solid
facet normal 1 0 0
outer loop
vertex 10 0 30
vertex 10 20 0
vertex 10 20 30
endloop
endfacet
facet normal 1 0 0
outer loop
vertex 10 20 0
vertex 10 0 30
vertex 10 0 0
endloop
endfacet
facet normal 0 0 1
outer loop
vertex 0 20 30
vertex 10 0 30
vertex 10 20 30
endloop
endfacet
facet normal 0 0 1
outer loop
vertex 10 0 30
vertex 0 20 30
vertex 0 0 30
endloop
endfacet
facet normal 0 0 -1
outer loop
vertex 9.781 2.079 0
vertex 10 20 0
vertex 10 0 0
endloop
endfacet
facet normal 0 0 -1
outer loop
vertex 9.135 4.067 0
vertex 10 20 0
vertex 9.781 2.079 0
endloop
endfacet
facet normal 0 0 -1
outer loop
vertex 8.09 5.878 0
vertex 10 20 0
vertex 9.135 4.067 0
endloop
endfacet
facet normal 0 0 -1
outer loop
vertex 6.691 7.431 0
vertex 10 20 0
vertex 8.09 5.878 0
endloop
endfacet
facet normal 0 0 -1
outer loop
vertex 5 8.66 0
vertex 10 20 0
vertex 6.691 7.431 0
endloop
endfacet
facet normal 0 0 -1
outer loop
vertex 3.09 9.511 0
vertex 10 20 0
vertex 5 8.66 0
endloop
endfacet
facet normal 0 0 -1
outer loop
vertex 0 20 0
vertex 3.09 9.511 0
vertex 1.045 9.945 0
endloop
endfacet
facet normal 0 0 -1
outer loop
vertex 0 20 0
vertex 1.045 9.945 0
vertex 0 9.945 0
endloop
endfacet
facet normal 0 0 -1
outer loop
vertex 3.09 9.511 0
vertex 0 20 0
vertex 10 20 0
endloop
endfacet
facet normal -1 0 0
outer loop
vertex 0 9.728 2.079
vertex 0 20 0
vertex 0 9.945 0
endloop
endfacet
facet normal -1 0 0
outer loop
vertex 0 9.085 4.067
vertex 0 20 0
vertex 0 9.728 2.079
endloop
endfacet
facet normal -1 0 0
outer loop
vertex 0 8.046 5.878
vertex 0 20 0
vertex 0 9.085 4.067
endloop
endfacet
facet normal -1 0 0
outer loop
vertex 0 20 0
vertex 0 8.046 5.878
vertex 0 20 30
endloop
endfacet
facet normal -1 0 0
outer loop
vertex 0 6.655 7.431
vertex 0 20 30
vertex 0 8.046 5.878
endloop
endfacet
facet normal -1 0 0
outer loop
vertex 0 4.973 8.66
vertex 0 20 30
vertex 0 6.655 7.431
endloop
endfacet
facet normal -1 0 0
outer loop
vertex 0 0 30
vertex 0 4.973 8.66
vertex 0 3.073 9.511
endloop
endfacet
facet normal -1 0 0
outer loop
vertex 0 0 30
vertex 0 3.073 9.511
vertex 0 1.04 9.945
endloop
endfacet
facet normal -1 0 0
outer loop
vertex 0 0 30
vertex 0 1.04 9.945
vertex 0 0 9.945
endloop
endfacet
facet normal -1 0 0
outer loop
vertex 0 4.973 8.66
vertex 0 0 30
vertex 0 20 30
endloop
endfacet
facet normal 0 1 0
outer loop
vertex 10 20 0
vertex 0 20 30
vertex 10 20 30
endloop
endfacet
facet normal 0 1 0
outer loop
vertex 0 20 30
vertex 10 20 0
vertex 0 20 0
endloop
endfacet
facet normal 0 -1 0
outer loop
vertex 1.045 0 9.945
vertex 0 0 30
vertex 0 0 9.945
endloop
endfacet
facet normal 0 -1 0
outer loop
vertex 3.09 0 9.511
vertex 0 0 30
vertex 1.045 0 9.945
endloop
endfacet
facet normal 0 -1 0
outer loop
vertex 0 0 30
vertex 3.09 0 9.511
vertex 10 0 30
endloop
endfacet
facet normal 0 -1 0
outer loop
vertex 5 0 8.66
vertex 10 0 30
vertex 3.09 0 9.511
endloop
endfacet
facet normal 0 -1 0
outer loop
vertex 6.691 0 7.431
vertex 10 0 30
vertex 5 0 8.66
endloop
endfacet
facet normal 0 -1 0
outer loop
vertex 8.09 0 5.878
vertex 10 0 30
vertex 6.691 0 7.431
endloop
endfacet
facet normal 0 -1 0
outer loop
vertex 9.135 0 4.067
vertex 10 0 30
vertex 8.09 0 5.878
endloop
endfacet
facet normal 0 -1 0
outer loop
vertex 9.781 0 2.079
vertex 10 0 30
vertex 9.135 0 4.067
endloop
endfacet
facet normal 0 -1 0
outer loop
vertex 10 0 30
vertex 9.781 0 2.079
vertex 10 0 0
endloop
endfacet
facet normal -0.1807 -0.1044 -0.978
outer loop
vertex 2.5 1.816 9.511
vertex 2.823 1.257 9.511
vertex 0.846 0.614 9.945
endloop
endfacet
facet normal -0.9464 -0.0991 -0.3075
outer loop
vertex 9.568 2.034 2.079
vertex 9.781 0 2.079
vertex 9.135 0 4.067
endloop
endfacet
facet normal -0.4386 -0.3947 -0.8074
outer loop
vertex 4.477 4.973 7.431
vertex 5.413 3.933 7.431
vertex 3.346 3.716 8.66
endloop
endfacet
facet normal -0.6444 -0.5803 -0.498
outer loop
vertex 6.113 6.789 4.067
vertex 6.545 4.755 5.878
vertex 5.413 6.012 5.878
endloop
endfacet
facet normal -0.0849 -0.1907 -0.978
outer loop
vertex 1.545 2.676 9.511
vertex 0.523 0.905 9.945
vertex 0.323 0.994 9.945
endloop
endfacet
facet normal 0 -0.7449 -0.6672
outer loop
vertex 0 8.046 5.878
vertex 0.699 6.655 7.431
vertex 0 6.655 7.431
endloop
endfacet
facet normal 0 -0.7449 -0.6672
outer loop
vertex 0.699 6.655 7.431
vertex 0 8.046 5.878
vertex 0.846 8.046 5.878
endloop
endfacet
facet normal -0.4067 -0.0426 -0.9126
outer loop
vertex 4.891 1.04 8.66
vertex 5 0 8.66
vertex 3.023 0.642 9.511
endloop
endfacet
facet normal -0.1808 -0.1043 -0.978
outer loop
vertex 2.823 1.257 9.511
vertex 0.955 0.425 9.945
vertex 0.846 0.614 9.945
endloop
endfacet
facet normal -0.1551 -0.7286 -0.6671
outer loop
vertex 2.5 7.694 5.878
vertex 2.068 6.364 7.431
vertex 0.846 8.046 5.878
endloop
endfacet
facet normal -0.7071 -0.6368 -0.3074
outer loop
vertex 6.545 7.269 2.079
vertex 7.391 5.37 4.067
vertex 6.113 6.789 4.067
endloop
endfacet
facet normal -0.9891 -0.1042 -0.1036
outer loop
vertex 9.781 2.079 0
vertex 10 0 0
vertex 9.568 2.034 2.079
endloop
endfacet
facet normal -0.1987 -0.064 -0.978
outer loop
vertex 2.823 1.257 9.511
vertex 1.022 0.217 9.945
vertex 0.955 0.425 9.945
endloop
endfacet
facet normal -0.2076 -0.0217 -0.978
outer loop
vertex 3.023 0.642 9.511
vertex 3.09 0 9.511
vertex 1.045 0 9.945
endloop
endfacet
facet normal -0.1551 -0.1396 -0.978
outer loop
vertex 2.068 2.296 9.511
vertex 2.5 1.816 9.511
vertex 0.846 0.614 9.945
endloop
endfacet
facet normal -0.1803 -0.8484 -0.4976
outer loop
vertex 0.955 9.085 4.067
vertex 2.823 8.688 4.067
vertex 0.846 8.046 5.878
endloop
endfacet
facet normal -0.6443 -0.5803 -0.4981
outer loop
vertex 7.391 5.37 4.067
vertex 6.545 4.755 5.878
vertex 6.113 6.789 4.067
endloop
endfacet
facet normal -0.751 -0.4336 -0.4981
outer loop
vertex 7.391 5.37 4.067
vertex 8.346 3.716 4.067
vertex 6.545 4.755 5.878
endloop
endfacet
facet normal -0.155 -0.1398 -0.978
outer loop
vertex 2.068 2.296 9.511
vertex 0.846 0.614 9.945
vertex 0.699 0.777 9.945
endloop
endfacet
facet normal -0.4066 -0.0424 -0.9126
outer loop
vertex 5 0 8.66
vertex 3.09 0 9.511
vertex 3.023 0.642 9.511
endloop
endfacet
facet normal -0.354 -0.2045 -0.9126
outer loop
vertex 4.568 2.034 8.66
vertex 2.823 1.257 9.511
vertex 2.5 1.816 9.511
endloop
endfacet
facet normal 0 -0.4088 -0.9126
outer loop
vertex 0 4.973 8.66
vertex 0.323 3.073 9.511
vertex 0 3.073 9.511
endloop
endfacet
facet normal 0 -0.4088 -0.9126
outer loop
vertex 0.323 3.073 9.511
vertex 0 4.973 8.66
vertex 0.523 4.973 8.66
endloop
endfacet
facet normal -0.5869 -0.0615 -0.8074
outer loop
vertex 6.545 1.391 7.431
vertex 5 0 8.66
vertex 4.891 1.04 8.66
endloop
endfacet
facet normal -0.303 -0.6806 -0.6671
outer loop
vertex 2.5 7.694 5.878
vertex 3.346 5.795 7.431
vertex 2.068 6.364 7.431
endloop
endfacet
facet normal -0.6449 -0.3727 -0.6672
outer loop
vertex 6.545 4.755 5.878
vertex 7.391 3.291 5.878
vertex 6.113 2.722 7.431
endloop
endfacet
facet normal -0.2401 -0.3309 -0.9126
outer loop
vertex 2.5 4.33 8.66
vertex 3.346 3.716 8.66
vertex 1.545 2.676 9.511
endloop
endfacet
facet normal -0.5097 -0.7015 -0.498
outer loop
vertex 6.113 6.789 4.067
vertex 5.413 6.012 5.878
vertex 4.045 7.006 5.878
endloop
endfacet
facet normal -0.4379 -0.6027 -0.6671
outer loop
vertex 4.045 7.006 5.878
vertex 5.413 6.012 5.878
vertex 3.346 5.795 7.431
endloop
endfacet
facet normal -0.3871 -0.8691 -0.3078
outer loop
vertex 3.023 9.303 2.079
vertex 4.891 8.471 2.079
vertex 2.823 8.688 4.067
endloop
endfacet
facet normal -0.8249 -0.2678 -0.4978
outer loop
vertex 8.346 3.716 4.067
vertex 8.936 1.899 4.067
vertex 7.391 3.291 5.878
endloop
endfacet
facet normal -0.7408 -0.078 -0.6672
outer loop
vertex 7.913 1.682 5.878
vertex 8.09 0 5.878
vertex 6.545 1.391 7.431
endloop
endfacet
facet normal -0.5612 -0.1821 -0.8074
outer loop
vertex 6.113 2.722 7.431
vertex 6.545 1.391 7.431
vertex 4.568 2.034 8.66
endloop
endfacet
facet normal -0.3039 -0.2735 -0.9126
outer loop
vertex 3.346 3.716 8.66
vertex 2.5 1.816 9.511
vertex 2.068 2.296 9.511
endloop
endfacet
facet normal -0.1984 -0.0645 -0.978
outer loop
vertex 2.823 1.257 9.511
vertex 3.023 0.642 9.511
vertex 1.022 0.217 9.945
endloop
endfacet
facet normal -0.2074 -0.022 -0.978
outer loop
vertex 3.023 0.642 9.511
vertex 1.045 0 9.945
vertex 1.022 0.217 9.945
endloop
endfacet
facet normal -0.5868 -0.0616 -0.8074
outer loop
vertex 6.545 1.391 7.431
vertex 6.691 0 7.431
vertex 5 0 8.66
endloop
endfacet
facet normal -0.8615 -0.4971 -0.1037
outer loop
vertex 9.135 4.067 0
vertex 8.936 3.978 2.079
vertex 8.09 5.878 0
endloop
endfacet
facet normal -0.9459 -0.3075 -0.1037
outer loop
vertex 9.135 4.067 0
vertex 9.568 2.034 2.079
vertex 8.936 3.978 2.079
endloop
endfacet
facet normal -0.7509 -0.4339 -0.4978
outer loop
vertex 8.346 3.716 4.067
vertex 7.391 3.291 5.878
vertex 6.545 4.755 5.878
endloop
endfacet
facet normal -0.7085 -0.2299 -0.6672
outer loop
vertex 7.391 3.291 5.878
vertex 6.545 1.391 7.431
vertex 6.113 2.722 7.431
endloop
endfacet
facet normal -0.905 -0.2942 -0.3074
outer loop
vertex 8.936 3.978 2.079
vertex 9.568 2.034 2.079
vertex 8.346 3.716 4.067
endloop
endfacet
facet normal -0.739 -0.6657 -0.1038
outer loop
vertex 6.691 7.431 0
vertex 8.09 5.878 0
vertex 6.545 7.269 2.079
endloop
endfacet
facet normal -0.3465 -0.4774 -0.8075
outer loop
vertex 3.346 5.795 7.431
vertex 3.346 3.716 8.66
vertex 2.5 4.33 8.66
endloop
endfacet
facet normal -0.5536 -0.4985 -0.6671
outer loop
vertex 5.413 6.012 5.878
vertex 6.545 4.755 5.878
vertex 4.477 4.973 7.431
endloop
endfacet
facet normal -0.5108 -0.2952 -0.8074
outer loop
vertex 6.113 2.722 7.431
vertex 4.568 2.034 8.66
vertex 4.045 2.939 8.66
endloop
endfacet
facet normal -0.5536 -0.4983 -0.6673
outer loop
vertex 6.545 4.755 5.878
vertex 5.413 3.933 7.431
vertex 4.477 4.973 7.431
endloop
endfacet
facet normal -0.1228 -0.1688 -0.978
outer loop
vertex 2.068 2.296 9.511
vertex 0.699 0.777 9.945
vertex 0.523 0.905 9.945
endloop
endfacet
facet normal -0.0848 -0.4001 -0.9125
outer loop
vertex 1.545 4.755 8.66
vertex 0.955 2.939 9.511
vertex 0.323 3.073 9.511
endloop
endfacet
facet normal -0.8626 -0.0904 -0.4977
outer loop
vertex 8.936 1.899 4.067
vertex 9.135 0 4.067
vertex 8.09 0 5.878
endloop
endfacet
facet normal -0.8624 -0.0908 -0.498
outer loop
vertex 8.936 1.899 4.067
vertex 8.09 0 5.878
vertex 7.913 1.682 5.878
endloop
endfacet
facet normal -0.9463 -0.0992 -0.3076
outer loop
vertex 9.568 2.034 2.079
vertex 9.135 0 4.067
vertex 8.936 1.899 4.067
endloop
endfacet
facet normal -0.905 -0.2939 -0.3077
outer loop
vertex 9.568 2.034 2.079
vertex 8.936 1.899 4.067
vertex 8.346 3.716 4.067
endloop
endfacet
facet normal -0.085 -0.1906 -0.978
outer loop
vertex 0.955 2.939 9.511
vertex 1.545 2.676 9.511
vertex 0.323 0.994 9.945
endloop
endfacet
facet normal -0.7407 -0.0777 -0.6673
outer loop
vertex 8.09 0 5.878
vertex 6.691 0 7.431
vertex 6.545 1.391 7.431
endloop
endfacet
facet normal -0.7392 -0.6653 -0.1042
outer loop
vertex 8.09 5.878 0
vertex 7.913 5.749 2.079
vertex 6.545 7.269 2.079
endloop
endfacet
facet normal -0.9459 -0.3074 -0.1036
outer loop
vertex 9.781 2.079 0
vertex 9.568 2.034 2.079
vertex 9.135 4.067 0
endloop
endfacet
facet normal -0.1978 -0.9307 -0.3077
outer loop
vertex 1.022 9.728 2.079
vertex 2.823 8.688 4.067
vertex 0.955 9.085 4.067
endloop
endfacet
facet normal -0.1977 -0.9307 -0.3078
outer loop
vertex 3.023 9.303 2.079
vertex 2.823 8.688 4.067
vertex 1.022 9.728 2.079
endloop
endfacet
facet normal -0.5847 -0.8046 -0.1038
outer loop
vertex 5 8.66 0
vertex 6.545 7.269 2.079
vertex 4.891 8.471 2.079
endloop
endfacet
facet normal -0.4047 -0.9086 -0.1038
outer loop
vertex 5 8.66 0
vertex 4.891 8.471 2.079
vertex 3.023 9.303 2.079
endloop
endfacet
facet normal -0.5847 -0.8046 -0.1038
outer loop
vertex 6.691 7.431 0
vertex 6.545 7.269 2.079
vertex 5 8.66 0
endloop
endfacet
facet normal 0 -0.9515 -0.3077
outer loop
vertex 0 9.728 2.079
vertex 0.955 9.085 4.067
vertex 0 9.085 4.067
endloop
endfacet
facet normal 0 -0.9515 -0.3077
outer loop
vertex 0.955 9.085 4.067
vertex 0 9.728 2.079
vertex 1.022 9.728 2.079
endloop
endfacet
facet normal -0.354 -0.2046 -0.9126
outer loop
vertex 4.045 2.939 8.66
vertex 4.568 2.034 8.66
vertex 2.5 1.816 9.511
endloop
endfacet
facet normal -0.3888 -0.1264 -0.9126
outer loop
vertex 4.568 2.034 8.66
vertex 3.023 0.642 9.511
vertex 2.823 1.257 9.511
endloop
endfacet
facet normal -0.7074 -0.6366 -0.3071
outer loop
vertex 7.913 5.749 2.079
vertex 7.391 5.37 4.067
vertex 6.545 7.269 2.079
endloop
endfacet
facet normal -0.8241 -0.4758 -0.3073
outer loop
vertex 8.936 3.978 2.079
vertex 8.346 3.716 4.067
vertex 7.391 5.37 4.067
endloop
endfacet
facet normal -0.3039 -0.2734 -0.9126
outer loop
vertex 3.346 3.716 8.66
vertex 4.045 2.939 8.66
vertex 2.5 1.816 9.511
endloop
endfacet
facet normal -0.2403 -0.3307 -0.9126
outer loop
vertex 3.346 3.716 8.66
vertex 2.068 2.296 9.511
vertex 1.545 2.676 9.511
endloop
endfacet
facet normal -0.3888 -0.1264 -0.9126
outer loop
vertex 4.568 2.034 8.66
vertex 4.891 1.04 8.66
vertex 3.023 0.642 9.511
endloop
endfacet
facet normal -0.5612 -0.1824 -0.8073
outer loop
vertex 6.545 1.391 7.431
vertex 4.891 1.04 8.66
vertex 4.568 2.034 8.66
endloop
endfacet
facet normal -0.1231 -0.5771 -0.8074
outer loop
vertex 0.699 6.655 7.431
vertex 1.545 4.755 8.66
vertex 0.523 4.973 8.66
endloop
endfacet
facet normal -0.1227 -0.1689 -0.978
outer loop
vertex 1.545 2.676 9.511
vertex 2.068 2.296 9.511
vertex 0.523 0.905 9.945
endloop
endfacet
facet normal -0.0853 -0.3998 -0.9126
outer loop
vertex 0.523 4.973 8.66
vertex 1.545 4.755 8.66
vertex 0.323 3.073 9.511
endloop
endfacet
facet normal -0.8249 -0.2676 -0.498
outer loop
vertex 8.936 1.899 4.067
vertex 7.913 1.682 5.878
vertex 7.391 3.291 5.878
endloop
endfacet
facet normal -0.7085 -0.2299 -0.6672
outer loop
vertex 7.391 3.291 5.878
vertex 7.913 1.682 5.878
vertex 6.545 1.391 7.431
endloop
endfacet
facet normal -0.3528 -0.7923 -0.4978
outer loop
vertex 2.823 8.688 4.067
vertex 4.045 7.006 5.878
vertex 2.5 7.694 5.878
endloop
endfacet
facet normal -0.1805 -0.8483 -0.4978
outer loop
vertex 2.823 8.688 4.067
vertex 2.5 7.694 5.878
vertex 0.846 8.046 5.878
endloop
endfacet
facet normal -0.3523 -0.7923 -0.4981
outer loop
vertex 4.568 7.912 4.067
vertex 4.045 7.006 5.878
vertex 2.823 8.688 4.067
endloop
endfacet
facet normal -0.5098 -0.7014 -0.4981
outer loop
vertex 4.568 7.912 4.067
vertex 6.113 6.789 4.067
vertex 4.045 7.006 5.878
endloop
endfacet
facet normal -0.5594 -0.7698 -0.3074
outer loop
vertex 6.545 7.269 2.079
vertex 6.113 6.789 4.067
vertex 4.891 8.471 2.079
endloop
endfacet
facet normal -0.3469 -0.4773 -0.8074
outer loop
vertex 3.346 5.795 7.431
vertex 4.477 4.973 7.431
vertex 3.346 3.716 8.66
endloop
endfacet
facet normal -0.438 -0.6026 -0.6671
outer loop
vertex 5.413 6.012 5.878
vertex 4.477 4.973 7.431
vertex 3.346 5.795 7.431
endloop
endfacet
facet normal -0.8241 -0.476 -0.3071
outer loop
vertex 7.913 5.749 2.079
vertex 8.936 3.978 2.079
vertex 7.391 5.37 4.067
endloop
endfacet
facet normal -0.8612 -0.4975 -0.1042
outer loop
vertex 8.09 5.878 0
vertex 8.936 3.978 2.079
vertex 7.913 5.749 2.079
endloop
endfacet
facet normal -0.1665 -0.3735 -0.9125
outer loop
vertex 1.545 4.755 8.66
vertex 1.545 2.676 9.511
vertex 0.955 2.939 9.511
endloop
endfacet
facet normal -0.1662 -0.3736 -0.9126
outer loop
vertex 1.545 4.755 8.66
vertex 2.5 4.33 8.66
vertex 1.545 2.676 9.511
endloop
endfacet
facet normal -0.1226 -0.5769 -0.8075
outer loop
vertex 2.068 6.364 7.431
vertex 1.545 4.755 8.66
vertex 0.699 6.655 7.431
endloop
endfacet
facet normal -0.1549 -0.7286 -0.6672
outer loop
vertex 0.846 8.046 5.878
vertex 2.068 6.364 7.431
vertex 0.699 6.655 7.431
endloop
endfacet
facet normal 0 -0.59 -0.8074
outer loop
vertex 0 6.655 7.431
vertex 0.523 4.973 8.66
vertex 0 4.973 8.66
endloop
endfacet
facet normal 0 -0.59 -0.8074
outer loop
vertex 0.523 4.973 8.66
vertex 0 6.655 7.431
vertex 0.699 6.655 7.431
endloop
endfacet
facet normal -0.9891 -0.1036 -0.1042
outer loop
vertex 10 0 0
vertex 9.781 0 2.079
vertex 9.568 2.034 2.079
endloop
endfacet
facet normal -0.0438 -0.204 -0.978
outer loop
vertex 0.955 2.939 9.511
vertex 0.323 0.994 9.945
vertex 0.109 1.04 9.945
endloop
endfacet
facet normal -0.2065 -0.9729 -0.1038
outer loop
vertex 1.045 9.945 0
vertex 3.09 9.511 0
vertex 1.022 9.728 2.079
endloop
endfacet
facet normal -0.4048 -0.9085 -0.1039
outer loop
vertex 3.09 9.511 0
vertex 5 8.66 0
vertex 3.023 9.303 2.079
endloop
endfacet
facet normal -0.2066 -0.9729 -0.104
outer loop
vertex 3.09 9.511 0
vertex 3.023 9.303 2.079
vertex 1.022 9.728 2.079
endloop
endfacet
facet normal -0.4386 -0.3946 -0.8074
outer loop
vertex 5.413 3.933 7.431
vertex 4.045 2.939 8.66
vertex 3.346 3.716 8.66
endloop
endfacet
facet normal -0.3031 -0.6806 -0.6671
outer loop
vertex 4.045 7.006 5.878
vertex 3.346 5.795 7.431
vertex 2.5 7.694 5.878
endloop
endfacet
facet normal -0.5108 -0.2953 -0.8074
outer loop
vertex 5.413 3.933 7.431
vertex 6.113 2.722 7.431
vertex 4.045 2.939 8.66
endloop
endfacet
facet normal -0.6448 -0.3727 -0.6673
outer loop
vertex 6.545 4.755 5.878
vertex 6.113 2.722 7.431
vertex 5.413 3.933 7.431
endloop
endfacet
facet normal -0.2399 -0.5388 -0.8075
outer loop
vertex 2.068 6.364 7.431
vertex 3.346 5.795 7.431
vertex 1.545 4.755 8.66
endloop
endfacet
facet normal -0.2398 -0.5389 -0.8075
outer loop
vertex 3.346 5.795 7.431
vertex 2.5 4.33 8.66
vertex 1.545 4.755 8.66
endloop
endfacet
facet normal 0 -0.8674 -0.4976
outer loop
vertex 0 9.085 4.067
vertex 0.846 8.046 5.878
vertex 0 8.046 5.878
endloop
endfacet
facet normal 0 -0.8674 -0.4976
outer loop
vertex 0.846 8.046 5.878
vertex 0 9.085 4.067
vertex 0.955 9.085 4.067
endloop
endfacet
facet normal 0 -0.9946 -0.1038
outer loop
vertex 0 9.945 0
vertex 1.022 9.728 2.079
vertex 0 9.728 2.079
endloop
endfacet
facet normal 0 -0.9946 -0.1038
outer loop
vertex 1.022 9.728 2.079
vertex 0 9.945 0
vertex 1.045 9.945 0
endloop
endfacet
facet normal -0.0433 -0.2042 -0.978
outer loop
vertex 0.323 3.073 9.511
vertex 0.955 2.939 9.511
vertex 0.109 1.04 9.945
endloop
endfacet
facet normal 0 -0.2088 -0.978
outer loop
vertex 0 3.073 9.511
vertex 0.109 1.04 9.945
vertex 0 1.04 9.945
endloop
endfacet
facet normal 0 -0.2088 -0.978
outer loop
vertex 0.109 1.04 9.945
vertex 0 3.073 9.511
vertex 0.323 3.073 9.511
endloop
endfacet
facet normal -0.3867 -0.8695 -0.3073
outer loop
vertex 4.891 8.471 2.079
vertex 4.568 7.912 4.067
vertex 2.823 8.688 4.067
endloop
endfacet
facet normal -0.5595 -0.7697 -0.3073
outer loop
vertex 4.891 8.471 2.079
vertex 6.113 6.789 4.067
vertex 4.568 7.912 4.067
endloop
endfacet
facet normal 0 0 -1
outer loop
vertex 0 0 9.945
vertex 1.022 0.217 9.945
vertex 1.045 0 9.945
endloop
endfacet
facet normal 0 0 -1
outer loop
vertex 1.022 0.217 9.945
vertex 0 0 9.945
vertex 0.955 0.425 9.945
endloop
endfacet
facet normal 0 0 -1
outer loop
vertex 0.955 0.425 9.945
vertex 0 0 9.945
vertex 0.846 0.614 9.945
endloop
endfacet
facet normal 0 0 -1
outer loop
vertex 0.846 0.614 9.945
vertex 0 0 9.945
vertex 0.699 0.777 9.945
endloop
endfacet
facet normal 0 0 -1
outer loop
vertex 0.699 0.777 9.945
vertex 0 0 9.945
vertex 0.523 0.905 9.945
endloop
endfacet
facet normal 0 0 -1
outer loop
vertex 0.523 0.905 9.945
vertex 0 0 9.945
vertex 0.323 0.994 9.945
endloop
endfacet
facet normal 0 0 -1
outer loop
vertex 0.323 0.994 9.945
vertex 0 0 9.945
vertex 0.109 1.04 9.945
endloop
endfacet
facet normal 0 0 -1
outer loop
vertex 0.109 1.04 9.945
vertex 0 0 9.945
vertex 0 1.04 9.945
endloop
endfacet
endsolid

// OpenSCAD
union() {
	difference() {
		cube(size = [10, 20, 30]);
		#sphere(r = 10);
	}
	%cylinder(h = 30, r = 4);
}
